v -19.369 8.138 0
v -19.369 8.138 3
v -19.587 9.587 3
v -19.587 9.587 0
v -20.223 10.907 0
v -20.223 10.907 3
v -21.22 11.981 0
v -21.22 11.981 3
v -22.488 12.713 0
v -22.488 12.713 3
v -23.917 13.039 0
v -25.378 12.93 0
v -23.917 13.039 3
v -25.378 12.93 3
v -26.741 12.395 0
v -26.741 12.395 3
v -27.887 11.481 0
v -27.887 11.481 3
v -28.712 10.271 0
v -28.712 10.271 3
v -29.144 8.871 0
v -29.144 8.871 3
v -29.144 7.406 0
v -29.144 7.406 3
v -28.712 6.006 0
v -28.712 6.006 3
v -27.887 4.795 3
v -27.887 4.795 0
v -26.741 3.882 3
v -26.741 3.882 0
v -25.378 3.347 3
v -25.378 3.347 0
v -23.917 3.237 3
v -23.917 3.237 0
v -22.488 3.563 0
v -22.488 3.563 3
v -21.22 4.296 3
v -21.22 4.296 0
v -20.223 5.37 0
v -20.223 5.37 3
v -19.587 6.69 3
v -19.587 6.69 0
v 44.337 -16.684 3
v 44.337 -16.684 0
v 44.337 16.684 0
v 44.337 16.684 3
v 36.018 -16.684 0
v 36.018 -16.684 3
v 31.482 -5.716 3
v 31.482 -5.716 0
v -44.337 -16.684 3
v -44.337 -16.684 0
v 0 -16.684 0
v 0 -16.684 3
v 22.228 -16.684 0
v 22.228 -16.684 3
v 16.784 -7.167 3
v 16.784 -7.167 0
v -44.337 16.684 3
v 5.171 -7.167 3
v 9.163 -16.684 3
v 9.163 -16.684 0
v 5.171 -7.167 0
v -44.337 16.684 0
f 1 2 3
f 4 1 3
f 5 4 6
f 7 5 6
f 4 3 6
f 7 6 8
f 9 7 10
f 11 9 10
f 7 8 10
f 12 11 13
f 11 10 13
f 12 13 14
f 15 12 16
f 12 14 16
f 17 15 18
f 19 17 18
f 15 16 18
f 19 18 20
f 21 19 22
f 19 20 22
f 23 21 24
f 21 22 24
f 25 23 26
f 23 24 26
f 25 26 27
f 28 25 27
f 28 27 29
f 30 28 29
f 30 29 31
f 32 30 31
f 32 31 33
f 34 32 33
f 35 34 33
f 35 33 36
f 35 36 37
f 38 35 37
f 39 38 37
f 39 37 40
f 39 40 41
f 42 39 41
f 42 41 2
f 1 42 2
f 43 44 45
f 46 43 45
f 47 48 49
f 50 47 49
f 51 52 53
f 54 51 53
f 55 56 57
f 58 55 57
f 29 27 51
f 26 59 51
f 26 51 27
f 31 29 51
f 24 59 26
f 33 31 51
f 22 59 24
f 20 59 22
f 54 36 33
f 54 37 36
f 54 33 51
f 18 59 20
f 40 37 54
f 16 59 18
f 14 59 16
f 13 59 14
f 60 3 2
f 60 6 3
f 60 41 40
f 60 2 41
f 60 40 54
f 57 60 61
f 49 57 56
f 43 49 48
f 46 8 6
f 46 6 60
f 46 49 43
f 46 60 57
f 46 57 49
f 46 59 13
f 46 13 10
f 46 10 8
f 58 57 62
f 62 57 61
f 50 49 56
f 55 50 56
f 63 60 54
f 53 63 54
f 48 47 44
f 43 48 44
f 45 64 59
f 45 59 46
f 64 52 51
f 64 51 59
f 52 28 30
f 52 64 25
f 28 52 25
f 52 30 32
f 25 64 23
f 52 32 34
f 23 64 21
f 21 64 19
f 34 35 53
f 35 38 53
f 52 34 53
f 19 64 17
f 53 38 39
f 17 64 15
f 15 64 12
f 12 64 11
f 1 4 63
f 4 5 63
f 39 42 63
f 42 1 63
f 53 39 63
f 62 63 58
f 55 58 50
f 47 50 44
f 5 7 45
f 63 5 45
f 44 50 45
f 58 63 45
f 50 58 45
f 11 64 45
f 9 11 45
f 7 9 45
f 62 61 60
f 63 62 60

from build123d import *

# Parameters (mm, degrees)
F0_W     = 88.67468
F0_H     = 33.368226
F1_DEPTH = 3
F2_R     = 4.914899
F3_DEPTH = 25
F5_DEPTH = 25


with BuildPart() as f1:
    # F0 (on Top) → F1 (new body)
    with BuildSketch(Plane.XY):
        Rectangle(F0_W, F0_H)
    extrude(amount=F1_DEPTH)

    # F2 (on face) → F3 (cut)
    with BuildSketch(Plane.XY.offset(3)):
        with Locations((-24.283957, 8.138201)):
            Circle(F2_R)
    extrude(amount=-F3_DEPTH, mode=Mode.SUBTRACT)

    # F4 (on face) → F5 (cut)
    with BuildSketch(Plane.XY.offset(3)):
        Polygon((5.171371, -7.167339), (0, -16.684113), (18.780243, -47.993954), (36.018144, -16.684113), (31.481858, -5.715726), (22.227822, -16.684113), (16.784273, -7.167339), (9.163308, -16.684113), align=None)
    extrude(amount=-F5_DEPTH, mode=Mode.SUBTRACT)


solid = f1.part
